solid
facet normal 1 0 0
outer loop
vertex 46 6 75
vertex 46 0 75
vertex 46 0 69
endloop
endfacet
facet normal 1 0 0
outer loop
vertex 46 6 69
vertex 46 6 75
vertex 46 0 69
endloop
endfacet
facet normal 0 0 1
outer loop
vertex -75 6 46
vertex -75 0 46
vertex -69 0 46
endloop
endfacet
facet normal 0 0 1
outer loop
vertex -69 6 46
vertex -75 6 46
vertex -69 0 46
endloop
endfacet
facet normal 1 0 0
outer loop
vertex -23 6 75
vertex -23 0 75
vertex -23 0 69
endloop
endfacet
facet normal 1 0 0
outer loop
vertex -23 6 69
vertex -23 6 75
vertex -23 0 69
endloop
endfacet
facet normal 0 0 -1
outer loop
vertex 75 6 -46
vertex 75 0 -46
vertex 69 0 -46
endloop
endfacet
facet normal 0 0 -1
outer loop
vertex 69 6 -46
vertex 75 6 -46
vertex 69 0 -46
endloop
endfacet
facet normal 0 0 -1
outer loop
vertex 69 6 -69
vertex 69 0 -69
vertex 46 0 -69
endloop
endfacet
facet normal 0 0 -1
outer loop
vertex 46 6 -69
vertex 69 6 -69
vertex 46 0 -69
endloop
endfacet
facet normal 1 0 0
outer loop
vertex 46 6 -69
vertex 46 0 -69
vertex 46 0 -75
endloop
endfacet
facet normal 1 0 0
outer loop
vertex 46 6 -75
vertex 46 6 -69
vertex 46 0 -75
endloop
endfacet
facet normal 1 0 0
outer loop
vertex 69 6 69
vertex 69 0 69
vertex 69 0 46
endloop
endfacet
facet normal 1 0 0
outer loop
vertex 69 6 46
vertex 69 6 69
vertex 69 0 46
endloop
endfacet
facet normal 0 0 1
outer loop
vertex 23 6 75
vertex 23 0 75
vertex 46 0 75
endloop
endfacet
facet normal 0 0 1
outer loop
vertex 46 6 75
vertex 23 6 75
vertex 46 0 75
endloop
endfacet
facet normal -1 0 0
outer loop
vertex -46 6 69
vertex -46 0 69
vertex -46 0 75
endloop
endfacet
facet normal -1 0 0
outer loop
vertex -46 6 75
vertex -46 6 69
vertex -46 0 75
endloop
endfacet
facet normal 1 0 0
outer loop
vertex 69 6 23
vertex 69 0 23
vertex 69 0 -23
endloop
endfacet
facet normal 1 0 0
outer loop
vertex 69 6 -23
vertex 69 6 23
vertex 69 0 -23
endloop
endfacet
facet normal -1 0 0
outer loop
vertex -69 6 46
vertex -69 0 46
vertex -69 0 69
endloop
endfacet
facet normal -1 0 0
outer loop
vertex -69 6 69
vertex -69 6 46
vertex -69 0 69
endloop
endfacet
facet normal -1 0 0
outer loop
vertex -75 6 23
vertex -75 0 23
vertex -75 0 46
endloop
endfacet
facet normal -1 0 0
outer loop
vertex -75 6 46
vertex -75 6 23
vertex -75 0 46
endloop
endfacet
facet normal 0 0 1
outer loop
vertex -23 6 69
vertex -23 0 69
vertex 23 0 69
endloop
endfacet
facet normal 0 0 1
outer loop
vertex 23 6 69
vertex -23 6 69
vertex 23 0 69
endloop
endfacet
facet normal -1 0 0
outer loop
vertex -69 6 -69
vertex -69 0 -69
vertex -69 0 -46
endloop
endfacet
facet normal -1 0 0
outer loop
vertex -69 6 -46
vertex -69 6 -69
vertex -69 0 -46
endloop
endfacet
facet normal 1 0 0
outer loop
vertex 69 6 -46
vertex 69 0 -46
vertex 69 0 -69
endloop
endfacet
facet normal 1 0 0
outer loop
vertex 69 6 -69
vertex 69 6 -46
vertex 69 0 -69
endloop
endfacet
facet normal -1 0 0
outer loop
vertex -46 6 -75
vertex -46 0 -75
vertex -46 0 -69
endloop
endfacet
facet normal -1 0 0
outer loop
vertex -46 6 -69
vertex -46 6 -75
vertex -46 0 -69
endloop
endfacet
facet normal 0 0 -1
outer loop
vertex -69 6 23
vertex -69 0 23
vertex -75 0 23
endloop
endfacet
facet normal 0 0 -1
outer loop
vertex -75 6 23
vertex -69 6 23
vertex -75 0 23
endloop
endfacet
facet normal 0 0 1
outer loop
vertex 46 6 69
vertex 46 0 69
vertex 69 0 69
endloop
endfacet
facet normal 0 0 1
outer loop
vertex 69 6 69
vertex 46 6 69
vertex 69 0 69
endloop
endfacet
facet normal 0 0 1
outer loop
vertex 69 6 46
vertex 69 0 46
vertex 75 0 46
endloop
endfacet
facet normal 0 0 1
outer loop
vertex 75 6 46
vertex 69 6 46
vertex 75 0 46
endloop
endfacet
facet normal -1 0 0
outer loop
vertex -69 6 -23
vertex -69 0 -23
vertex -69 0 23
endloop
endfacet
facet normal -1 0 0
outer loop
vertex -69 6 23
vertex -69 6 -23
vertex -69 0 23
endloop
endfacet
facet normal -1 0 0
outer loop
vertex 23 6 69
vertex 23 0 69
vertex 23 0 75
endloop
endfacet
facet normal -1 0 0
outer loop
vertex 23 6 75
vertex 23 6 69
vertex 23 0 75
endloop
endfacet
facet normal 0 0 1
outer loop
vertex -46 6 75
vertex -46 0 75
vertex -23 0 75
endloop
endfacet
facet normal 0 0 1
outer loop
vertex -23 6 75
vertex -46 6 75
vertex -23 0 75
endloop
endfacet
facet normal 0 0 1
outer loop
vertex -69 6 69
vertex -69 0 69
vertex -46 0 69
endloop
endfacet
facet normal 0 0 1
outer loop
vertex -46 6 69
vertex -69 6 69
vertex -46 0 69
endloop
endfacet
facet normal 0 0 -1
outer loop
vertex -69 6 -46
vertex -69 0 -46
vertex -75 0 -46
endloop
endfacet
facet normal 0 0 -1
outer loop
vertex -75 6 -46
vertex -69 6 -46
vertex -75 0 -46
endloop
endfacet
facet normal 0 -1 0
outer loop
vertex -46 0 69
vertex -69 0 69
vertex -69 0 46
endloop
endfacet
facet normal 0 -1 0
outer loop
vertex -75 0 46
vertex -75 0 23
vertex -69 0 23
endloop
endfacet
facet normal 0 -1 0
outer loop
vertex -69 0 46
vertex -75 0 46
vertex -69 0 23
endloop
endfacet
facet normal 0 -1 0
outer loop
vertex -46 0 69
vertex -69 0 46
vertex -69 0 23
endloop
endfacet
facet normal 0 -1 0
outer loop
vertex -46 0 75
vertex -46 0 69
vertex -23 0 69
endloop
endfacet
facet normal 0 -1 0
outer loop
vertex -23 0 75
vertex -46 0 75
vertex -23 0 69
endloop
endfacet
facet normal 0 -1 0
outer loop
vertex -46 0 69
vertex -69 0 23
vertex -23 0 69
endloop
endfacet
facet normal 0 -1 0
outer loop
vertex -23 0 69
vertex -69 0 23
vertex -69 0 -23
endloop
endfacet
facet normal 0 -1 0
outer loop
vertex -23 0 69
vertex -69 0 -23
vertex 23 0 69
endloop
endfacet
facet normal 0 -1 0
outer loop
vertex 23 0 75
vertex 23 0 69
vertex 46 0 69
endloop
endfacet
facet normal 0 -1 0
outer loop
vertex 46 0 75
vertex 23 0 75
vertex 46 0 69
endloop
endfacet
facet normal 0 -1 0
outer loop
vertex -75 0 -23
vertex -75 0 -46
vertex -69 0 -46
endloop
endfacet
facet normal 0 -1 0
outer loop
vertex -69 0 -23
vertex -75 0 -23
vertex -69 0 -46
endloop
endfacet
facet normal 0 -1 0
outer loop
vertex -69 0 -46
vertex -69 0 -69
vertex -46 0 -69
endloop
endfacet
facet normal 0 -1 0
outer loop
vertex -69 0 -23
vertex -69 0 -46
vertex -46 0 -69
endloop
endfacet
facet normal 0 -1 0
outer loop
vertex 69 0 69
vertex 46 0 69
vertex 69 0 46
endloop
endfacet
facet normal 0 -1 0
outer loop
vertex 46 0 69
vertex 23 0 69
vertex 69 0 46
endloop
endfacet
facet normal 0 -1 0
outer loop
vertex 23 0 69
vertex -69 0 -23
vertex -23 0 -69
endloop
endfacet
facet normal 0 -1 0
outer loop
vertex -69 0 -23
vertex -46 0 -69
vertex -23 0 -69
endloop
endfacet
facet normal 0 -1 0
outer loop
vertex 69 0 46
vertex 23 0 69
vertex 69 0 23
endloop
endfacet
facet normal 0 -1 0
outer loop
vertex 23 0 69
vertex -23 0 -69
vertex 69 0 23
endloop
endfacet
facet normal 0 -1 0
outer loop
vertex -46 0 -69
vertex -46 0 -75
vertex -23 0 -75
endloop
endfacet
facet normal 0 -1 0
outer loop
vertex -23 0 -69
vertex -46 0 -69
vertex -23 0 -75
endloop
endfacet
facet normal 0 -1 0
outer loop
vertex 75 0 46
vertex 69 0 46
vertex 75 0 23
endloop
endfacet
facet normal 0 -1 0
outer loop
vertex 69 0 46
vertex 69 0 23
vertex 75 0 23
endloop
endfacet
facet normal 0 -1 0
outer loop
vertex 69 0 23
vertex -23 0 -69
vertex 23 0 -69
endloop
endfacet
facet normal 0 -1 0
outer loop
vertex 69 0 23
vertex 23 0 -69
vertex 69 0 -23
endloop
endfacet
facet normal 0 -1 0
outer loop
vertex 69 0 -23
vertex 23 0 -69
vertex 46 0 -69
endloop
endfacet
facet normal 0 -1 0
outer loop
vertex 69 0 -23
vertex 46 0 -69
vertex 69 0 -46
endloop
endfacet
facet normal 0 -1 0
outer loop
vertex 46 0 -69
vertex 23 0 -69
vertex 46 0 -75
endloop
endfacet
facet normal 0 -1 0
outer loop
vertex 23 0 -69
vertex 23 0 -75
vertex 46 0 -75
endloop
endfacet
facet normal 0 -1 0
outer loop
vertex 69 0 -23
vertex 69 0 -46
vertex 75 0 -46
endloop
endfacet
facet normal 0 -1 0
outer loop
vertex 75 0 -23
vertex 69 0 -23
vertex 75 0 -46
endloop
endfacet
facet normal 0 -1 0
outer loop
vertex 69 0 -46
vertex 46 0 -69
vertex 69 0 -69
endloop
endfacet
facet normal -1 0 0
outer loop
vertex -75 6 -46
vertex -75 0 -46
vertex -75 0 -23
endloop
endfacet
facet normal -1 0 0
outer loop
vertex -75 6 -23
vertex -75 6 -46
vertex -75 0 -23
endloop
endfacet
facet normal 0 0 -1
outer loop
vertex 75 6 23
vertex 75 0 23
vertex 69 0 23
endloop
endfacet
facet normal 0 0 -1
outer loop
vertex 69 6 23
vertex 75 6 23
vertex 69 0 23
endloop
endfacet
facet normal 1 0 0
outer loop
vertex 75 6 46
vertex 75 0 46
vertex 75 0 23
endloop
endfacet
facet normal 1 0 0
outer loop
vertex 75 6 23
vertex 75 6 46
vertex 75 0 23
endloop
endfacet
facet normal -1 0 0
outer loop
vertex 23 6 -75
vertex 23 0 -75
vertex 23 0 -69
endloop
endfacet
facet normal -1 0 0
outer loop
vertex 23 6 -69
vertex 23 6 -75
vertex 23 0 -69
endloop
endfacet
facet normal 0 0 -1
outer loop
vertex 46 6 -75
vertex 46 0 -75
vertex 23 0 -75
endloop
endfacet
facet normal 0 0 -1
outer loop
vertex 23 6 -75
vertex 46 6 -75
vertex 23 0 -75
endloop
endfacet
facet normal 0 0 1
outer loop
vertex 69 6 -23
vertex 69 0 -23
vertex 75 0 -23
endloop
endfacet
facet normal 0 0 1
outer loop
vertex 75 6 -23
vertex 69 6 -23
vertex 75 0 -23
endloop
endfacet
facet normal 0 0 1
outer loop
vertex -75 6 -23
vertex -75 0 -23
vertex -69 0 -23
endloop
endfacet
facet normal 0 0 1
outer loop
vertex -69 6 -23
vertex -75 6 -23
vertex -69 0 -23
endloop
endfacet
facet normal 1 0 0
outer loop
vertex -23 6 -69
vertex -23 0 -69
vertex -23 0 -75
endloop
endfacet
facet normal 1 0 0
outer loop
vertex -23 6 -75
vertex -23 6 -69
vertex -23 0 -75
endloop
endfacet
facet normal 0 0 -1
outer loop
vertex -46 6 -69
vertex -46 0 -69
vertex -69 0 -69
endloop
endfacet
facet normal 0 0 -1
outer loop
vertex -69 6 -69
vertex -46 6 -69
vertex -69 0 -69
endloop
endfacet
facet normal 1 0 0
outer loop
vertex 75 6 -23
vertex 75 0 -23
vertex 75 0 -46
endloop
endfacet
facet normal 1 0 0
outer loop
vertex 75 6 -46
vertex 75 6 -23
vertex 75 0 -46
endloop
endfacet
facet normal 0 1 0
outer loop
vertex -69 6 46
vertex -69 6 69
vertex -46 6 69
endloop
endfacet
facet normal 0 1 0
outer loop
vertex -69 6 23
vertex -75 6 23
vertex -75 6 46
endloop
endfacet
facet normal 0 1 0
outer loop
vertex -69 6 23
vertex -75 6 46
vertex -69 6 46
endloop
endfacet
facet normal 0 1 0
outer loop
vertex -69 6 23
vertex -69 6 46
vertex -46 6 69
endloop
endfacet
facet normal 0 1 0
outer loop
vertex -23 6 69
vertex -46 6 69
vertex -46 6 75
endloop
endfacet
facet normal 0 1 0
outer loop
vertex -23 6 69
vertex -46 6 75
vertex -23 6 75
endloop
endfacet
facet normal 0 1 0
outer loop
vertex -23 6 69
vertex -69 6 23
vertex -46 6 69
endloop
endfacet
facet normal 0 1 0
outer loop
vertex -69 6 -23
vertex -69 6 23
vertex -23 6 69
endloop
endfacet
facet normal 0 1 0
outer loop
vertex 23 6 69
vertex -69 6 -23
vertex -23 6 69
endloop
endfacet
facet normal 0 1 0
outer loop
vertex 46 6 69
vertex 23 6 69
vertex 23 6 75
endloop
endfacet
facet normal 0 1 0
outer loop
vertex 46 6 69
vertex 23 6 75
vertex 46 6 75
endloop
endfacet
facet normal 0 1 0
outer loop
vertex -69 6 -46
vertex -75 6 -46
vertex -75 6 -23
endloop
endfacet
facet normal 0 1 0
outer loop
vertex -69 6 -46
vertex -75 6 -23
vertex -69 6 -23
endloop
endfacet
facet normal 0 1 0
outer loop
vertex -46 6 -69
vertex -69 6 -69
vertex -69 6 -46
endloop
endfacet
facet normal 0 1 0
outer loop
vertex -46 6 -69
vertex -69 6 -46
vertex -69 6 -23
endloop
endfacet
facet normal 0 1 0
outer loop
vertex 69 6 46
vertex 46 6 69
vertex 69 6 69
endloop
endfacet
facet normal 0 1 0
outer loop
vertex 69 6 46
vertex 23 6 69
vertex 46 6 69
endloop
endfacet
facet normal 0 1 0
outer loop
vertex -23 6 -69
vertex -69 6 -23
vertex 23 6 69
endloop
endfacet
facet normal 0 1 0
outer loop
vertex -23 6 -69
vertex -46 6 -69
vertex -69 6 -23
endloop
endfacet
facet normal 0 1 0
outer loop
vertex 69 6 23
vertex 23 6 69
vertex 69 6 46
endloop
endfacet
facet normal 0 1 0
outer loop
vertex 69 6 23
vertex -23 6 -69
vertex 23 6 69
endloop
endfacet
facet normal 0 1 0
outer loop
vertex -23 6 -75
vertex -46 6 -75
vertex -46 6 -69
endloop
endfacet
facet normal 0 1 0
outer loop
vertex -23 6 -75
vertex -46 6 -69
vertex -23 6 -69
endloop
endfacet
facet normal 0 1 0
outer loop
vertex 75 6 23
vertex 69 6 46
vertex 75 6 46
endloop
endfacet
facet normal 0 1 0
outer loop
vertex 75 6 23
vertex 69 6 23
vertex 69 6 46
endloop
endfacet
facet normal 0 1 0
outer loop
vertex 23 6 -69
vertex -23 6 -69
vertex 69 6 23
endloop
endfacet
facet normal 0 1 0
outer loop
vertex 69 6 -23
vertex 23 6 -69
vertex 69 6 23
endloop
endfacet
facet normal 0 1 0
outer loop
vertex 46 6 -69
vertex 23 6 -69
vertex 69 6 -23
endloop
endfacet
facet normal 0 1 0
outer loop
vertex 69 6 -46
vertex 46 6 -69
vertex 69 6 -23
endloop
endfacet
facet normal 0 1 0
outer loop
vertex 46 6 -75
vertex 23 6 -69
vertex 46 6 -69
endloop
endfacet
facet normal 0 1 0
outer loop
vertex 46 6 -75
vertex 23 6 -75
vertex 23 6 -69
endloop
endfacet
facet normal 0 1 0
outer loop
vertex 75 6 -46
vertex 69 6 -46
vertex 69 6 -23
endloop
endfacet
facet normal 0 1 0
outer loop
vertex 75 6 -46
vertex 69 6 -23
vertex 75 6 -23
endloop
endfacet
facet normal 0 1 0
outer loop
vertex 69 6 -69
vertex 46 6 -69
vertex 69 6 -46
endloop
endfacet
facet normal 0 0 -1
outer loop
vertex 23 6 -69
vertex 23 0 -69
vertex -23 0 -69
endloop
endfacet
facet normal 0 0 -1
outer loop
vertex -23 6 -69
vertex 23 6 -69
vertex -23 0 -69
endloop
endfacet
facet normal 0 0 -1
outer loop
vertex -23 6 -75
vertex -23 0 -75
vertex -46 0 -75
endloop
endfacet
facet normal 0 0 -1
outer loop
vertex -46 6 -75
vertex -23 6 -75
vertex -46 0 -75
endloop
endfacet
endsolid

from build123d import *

# Parameters (mm, degrees)
BOSS_EXTRUDE1_DEPTH = 6


with BuildPart() as part:
    # Sketch1 → Boss-Extrude1 (new body)
    with BuildSketch(Plane(origin=(0, 0, 0), x_dir=(1, 0, 0), z_dir=(0, 1, 0))):
        Polygon((0, 69), (-23, 69), (-23, 75), (-46, 75), (-46, 69), (-69, 69), (-69, 46), (-75, 46), (-75, 23), (-69, 23), (-69, 0), (-69, -23), (-75, -23), (-75, -46), (-69, -46), (-69, -69), (-46, -69), (-46, -75), (-23, -75), (-23, -69), (0, -69), (23, -69), (23, -75), (46, -75), (46, -69), (69, -69), (69, -46), (75, -46), (75, -23), (69, -23), (69, 0), (69, 23), (75, 23), (75, 46), (69, 46), (69, 69), (46, 69), (46, 75), (23, 75), (23, 69), align=None)
    extrude(amount=BOSS_EXTRUDE1_DEPTH)


solid = part.part
